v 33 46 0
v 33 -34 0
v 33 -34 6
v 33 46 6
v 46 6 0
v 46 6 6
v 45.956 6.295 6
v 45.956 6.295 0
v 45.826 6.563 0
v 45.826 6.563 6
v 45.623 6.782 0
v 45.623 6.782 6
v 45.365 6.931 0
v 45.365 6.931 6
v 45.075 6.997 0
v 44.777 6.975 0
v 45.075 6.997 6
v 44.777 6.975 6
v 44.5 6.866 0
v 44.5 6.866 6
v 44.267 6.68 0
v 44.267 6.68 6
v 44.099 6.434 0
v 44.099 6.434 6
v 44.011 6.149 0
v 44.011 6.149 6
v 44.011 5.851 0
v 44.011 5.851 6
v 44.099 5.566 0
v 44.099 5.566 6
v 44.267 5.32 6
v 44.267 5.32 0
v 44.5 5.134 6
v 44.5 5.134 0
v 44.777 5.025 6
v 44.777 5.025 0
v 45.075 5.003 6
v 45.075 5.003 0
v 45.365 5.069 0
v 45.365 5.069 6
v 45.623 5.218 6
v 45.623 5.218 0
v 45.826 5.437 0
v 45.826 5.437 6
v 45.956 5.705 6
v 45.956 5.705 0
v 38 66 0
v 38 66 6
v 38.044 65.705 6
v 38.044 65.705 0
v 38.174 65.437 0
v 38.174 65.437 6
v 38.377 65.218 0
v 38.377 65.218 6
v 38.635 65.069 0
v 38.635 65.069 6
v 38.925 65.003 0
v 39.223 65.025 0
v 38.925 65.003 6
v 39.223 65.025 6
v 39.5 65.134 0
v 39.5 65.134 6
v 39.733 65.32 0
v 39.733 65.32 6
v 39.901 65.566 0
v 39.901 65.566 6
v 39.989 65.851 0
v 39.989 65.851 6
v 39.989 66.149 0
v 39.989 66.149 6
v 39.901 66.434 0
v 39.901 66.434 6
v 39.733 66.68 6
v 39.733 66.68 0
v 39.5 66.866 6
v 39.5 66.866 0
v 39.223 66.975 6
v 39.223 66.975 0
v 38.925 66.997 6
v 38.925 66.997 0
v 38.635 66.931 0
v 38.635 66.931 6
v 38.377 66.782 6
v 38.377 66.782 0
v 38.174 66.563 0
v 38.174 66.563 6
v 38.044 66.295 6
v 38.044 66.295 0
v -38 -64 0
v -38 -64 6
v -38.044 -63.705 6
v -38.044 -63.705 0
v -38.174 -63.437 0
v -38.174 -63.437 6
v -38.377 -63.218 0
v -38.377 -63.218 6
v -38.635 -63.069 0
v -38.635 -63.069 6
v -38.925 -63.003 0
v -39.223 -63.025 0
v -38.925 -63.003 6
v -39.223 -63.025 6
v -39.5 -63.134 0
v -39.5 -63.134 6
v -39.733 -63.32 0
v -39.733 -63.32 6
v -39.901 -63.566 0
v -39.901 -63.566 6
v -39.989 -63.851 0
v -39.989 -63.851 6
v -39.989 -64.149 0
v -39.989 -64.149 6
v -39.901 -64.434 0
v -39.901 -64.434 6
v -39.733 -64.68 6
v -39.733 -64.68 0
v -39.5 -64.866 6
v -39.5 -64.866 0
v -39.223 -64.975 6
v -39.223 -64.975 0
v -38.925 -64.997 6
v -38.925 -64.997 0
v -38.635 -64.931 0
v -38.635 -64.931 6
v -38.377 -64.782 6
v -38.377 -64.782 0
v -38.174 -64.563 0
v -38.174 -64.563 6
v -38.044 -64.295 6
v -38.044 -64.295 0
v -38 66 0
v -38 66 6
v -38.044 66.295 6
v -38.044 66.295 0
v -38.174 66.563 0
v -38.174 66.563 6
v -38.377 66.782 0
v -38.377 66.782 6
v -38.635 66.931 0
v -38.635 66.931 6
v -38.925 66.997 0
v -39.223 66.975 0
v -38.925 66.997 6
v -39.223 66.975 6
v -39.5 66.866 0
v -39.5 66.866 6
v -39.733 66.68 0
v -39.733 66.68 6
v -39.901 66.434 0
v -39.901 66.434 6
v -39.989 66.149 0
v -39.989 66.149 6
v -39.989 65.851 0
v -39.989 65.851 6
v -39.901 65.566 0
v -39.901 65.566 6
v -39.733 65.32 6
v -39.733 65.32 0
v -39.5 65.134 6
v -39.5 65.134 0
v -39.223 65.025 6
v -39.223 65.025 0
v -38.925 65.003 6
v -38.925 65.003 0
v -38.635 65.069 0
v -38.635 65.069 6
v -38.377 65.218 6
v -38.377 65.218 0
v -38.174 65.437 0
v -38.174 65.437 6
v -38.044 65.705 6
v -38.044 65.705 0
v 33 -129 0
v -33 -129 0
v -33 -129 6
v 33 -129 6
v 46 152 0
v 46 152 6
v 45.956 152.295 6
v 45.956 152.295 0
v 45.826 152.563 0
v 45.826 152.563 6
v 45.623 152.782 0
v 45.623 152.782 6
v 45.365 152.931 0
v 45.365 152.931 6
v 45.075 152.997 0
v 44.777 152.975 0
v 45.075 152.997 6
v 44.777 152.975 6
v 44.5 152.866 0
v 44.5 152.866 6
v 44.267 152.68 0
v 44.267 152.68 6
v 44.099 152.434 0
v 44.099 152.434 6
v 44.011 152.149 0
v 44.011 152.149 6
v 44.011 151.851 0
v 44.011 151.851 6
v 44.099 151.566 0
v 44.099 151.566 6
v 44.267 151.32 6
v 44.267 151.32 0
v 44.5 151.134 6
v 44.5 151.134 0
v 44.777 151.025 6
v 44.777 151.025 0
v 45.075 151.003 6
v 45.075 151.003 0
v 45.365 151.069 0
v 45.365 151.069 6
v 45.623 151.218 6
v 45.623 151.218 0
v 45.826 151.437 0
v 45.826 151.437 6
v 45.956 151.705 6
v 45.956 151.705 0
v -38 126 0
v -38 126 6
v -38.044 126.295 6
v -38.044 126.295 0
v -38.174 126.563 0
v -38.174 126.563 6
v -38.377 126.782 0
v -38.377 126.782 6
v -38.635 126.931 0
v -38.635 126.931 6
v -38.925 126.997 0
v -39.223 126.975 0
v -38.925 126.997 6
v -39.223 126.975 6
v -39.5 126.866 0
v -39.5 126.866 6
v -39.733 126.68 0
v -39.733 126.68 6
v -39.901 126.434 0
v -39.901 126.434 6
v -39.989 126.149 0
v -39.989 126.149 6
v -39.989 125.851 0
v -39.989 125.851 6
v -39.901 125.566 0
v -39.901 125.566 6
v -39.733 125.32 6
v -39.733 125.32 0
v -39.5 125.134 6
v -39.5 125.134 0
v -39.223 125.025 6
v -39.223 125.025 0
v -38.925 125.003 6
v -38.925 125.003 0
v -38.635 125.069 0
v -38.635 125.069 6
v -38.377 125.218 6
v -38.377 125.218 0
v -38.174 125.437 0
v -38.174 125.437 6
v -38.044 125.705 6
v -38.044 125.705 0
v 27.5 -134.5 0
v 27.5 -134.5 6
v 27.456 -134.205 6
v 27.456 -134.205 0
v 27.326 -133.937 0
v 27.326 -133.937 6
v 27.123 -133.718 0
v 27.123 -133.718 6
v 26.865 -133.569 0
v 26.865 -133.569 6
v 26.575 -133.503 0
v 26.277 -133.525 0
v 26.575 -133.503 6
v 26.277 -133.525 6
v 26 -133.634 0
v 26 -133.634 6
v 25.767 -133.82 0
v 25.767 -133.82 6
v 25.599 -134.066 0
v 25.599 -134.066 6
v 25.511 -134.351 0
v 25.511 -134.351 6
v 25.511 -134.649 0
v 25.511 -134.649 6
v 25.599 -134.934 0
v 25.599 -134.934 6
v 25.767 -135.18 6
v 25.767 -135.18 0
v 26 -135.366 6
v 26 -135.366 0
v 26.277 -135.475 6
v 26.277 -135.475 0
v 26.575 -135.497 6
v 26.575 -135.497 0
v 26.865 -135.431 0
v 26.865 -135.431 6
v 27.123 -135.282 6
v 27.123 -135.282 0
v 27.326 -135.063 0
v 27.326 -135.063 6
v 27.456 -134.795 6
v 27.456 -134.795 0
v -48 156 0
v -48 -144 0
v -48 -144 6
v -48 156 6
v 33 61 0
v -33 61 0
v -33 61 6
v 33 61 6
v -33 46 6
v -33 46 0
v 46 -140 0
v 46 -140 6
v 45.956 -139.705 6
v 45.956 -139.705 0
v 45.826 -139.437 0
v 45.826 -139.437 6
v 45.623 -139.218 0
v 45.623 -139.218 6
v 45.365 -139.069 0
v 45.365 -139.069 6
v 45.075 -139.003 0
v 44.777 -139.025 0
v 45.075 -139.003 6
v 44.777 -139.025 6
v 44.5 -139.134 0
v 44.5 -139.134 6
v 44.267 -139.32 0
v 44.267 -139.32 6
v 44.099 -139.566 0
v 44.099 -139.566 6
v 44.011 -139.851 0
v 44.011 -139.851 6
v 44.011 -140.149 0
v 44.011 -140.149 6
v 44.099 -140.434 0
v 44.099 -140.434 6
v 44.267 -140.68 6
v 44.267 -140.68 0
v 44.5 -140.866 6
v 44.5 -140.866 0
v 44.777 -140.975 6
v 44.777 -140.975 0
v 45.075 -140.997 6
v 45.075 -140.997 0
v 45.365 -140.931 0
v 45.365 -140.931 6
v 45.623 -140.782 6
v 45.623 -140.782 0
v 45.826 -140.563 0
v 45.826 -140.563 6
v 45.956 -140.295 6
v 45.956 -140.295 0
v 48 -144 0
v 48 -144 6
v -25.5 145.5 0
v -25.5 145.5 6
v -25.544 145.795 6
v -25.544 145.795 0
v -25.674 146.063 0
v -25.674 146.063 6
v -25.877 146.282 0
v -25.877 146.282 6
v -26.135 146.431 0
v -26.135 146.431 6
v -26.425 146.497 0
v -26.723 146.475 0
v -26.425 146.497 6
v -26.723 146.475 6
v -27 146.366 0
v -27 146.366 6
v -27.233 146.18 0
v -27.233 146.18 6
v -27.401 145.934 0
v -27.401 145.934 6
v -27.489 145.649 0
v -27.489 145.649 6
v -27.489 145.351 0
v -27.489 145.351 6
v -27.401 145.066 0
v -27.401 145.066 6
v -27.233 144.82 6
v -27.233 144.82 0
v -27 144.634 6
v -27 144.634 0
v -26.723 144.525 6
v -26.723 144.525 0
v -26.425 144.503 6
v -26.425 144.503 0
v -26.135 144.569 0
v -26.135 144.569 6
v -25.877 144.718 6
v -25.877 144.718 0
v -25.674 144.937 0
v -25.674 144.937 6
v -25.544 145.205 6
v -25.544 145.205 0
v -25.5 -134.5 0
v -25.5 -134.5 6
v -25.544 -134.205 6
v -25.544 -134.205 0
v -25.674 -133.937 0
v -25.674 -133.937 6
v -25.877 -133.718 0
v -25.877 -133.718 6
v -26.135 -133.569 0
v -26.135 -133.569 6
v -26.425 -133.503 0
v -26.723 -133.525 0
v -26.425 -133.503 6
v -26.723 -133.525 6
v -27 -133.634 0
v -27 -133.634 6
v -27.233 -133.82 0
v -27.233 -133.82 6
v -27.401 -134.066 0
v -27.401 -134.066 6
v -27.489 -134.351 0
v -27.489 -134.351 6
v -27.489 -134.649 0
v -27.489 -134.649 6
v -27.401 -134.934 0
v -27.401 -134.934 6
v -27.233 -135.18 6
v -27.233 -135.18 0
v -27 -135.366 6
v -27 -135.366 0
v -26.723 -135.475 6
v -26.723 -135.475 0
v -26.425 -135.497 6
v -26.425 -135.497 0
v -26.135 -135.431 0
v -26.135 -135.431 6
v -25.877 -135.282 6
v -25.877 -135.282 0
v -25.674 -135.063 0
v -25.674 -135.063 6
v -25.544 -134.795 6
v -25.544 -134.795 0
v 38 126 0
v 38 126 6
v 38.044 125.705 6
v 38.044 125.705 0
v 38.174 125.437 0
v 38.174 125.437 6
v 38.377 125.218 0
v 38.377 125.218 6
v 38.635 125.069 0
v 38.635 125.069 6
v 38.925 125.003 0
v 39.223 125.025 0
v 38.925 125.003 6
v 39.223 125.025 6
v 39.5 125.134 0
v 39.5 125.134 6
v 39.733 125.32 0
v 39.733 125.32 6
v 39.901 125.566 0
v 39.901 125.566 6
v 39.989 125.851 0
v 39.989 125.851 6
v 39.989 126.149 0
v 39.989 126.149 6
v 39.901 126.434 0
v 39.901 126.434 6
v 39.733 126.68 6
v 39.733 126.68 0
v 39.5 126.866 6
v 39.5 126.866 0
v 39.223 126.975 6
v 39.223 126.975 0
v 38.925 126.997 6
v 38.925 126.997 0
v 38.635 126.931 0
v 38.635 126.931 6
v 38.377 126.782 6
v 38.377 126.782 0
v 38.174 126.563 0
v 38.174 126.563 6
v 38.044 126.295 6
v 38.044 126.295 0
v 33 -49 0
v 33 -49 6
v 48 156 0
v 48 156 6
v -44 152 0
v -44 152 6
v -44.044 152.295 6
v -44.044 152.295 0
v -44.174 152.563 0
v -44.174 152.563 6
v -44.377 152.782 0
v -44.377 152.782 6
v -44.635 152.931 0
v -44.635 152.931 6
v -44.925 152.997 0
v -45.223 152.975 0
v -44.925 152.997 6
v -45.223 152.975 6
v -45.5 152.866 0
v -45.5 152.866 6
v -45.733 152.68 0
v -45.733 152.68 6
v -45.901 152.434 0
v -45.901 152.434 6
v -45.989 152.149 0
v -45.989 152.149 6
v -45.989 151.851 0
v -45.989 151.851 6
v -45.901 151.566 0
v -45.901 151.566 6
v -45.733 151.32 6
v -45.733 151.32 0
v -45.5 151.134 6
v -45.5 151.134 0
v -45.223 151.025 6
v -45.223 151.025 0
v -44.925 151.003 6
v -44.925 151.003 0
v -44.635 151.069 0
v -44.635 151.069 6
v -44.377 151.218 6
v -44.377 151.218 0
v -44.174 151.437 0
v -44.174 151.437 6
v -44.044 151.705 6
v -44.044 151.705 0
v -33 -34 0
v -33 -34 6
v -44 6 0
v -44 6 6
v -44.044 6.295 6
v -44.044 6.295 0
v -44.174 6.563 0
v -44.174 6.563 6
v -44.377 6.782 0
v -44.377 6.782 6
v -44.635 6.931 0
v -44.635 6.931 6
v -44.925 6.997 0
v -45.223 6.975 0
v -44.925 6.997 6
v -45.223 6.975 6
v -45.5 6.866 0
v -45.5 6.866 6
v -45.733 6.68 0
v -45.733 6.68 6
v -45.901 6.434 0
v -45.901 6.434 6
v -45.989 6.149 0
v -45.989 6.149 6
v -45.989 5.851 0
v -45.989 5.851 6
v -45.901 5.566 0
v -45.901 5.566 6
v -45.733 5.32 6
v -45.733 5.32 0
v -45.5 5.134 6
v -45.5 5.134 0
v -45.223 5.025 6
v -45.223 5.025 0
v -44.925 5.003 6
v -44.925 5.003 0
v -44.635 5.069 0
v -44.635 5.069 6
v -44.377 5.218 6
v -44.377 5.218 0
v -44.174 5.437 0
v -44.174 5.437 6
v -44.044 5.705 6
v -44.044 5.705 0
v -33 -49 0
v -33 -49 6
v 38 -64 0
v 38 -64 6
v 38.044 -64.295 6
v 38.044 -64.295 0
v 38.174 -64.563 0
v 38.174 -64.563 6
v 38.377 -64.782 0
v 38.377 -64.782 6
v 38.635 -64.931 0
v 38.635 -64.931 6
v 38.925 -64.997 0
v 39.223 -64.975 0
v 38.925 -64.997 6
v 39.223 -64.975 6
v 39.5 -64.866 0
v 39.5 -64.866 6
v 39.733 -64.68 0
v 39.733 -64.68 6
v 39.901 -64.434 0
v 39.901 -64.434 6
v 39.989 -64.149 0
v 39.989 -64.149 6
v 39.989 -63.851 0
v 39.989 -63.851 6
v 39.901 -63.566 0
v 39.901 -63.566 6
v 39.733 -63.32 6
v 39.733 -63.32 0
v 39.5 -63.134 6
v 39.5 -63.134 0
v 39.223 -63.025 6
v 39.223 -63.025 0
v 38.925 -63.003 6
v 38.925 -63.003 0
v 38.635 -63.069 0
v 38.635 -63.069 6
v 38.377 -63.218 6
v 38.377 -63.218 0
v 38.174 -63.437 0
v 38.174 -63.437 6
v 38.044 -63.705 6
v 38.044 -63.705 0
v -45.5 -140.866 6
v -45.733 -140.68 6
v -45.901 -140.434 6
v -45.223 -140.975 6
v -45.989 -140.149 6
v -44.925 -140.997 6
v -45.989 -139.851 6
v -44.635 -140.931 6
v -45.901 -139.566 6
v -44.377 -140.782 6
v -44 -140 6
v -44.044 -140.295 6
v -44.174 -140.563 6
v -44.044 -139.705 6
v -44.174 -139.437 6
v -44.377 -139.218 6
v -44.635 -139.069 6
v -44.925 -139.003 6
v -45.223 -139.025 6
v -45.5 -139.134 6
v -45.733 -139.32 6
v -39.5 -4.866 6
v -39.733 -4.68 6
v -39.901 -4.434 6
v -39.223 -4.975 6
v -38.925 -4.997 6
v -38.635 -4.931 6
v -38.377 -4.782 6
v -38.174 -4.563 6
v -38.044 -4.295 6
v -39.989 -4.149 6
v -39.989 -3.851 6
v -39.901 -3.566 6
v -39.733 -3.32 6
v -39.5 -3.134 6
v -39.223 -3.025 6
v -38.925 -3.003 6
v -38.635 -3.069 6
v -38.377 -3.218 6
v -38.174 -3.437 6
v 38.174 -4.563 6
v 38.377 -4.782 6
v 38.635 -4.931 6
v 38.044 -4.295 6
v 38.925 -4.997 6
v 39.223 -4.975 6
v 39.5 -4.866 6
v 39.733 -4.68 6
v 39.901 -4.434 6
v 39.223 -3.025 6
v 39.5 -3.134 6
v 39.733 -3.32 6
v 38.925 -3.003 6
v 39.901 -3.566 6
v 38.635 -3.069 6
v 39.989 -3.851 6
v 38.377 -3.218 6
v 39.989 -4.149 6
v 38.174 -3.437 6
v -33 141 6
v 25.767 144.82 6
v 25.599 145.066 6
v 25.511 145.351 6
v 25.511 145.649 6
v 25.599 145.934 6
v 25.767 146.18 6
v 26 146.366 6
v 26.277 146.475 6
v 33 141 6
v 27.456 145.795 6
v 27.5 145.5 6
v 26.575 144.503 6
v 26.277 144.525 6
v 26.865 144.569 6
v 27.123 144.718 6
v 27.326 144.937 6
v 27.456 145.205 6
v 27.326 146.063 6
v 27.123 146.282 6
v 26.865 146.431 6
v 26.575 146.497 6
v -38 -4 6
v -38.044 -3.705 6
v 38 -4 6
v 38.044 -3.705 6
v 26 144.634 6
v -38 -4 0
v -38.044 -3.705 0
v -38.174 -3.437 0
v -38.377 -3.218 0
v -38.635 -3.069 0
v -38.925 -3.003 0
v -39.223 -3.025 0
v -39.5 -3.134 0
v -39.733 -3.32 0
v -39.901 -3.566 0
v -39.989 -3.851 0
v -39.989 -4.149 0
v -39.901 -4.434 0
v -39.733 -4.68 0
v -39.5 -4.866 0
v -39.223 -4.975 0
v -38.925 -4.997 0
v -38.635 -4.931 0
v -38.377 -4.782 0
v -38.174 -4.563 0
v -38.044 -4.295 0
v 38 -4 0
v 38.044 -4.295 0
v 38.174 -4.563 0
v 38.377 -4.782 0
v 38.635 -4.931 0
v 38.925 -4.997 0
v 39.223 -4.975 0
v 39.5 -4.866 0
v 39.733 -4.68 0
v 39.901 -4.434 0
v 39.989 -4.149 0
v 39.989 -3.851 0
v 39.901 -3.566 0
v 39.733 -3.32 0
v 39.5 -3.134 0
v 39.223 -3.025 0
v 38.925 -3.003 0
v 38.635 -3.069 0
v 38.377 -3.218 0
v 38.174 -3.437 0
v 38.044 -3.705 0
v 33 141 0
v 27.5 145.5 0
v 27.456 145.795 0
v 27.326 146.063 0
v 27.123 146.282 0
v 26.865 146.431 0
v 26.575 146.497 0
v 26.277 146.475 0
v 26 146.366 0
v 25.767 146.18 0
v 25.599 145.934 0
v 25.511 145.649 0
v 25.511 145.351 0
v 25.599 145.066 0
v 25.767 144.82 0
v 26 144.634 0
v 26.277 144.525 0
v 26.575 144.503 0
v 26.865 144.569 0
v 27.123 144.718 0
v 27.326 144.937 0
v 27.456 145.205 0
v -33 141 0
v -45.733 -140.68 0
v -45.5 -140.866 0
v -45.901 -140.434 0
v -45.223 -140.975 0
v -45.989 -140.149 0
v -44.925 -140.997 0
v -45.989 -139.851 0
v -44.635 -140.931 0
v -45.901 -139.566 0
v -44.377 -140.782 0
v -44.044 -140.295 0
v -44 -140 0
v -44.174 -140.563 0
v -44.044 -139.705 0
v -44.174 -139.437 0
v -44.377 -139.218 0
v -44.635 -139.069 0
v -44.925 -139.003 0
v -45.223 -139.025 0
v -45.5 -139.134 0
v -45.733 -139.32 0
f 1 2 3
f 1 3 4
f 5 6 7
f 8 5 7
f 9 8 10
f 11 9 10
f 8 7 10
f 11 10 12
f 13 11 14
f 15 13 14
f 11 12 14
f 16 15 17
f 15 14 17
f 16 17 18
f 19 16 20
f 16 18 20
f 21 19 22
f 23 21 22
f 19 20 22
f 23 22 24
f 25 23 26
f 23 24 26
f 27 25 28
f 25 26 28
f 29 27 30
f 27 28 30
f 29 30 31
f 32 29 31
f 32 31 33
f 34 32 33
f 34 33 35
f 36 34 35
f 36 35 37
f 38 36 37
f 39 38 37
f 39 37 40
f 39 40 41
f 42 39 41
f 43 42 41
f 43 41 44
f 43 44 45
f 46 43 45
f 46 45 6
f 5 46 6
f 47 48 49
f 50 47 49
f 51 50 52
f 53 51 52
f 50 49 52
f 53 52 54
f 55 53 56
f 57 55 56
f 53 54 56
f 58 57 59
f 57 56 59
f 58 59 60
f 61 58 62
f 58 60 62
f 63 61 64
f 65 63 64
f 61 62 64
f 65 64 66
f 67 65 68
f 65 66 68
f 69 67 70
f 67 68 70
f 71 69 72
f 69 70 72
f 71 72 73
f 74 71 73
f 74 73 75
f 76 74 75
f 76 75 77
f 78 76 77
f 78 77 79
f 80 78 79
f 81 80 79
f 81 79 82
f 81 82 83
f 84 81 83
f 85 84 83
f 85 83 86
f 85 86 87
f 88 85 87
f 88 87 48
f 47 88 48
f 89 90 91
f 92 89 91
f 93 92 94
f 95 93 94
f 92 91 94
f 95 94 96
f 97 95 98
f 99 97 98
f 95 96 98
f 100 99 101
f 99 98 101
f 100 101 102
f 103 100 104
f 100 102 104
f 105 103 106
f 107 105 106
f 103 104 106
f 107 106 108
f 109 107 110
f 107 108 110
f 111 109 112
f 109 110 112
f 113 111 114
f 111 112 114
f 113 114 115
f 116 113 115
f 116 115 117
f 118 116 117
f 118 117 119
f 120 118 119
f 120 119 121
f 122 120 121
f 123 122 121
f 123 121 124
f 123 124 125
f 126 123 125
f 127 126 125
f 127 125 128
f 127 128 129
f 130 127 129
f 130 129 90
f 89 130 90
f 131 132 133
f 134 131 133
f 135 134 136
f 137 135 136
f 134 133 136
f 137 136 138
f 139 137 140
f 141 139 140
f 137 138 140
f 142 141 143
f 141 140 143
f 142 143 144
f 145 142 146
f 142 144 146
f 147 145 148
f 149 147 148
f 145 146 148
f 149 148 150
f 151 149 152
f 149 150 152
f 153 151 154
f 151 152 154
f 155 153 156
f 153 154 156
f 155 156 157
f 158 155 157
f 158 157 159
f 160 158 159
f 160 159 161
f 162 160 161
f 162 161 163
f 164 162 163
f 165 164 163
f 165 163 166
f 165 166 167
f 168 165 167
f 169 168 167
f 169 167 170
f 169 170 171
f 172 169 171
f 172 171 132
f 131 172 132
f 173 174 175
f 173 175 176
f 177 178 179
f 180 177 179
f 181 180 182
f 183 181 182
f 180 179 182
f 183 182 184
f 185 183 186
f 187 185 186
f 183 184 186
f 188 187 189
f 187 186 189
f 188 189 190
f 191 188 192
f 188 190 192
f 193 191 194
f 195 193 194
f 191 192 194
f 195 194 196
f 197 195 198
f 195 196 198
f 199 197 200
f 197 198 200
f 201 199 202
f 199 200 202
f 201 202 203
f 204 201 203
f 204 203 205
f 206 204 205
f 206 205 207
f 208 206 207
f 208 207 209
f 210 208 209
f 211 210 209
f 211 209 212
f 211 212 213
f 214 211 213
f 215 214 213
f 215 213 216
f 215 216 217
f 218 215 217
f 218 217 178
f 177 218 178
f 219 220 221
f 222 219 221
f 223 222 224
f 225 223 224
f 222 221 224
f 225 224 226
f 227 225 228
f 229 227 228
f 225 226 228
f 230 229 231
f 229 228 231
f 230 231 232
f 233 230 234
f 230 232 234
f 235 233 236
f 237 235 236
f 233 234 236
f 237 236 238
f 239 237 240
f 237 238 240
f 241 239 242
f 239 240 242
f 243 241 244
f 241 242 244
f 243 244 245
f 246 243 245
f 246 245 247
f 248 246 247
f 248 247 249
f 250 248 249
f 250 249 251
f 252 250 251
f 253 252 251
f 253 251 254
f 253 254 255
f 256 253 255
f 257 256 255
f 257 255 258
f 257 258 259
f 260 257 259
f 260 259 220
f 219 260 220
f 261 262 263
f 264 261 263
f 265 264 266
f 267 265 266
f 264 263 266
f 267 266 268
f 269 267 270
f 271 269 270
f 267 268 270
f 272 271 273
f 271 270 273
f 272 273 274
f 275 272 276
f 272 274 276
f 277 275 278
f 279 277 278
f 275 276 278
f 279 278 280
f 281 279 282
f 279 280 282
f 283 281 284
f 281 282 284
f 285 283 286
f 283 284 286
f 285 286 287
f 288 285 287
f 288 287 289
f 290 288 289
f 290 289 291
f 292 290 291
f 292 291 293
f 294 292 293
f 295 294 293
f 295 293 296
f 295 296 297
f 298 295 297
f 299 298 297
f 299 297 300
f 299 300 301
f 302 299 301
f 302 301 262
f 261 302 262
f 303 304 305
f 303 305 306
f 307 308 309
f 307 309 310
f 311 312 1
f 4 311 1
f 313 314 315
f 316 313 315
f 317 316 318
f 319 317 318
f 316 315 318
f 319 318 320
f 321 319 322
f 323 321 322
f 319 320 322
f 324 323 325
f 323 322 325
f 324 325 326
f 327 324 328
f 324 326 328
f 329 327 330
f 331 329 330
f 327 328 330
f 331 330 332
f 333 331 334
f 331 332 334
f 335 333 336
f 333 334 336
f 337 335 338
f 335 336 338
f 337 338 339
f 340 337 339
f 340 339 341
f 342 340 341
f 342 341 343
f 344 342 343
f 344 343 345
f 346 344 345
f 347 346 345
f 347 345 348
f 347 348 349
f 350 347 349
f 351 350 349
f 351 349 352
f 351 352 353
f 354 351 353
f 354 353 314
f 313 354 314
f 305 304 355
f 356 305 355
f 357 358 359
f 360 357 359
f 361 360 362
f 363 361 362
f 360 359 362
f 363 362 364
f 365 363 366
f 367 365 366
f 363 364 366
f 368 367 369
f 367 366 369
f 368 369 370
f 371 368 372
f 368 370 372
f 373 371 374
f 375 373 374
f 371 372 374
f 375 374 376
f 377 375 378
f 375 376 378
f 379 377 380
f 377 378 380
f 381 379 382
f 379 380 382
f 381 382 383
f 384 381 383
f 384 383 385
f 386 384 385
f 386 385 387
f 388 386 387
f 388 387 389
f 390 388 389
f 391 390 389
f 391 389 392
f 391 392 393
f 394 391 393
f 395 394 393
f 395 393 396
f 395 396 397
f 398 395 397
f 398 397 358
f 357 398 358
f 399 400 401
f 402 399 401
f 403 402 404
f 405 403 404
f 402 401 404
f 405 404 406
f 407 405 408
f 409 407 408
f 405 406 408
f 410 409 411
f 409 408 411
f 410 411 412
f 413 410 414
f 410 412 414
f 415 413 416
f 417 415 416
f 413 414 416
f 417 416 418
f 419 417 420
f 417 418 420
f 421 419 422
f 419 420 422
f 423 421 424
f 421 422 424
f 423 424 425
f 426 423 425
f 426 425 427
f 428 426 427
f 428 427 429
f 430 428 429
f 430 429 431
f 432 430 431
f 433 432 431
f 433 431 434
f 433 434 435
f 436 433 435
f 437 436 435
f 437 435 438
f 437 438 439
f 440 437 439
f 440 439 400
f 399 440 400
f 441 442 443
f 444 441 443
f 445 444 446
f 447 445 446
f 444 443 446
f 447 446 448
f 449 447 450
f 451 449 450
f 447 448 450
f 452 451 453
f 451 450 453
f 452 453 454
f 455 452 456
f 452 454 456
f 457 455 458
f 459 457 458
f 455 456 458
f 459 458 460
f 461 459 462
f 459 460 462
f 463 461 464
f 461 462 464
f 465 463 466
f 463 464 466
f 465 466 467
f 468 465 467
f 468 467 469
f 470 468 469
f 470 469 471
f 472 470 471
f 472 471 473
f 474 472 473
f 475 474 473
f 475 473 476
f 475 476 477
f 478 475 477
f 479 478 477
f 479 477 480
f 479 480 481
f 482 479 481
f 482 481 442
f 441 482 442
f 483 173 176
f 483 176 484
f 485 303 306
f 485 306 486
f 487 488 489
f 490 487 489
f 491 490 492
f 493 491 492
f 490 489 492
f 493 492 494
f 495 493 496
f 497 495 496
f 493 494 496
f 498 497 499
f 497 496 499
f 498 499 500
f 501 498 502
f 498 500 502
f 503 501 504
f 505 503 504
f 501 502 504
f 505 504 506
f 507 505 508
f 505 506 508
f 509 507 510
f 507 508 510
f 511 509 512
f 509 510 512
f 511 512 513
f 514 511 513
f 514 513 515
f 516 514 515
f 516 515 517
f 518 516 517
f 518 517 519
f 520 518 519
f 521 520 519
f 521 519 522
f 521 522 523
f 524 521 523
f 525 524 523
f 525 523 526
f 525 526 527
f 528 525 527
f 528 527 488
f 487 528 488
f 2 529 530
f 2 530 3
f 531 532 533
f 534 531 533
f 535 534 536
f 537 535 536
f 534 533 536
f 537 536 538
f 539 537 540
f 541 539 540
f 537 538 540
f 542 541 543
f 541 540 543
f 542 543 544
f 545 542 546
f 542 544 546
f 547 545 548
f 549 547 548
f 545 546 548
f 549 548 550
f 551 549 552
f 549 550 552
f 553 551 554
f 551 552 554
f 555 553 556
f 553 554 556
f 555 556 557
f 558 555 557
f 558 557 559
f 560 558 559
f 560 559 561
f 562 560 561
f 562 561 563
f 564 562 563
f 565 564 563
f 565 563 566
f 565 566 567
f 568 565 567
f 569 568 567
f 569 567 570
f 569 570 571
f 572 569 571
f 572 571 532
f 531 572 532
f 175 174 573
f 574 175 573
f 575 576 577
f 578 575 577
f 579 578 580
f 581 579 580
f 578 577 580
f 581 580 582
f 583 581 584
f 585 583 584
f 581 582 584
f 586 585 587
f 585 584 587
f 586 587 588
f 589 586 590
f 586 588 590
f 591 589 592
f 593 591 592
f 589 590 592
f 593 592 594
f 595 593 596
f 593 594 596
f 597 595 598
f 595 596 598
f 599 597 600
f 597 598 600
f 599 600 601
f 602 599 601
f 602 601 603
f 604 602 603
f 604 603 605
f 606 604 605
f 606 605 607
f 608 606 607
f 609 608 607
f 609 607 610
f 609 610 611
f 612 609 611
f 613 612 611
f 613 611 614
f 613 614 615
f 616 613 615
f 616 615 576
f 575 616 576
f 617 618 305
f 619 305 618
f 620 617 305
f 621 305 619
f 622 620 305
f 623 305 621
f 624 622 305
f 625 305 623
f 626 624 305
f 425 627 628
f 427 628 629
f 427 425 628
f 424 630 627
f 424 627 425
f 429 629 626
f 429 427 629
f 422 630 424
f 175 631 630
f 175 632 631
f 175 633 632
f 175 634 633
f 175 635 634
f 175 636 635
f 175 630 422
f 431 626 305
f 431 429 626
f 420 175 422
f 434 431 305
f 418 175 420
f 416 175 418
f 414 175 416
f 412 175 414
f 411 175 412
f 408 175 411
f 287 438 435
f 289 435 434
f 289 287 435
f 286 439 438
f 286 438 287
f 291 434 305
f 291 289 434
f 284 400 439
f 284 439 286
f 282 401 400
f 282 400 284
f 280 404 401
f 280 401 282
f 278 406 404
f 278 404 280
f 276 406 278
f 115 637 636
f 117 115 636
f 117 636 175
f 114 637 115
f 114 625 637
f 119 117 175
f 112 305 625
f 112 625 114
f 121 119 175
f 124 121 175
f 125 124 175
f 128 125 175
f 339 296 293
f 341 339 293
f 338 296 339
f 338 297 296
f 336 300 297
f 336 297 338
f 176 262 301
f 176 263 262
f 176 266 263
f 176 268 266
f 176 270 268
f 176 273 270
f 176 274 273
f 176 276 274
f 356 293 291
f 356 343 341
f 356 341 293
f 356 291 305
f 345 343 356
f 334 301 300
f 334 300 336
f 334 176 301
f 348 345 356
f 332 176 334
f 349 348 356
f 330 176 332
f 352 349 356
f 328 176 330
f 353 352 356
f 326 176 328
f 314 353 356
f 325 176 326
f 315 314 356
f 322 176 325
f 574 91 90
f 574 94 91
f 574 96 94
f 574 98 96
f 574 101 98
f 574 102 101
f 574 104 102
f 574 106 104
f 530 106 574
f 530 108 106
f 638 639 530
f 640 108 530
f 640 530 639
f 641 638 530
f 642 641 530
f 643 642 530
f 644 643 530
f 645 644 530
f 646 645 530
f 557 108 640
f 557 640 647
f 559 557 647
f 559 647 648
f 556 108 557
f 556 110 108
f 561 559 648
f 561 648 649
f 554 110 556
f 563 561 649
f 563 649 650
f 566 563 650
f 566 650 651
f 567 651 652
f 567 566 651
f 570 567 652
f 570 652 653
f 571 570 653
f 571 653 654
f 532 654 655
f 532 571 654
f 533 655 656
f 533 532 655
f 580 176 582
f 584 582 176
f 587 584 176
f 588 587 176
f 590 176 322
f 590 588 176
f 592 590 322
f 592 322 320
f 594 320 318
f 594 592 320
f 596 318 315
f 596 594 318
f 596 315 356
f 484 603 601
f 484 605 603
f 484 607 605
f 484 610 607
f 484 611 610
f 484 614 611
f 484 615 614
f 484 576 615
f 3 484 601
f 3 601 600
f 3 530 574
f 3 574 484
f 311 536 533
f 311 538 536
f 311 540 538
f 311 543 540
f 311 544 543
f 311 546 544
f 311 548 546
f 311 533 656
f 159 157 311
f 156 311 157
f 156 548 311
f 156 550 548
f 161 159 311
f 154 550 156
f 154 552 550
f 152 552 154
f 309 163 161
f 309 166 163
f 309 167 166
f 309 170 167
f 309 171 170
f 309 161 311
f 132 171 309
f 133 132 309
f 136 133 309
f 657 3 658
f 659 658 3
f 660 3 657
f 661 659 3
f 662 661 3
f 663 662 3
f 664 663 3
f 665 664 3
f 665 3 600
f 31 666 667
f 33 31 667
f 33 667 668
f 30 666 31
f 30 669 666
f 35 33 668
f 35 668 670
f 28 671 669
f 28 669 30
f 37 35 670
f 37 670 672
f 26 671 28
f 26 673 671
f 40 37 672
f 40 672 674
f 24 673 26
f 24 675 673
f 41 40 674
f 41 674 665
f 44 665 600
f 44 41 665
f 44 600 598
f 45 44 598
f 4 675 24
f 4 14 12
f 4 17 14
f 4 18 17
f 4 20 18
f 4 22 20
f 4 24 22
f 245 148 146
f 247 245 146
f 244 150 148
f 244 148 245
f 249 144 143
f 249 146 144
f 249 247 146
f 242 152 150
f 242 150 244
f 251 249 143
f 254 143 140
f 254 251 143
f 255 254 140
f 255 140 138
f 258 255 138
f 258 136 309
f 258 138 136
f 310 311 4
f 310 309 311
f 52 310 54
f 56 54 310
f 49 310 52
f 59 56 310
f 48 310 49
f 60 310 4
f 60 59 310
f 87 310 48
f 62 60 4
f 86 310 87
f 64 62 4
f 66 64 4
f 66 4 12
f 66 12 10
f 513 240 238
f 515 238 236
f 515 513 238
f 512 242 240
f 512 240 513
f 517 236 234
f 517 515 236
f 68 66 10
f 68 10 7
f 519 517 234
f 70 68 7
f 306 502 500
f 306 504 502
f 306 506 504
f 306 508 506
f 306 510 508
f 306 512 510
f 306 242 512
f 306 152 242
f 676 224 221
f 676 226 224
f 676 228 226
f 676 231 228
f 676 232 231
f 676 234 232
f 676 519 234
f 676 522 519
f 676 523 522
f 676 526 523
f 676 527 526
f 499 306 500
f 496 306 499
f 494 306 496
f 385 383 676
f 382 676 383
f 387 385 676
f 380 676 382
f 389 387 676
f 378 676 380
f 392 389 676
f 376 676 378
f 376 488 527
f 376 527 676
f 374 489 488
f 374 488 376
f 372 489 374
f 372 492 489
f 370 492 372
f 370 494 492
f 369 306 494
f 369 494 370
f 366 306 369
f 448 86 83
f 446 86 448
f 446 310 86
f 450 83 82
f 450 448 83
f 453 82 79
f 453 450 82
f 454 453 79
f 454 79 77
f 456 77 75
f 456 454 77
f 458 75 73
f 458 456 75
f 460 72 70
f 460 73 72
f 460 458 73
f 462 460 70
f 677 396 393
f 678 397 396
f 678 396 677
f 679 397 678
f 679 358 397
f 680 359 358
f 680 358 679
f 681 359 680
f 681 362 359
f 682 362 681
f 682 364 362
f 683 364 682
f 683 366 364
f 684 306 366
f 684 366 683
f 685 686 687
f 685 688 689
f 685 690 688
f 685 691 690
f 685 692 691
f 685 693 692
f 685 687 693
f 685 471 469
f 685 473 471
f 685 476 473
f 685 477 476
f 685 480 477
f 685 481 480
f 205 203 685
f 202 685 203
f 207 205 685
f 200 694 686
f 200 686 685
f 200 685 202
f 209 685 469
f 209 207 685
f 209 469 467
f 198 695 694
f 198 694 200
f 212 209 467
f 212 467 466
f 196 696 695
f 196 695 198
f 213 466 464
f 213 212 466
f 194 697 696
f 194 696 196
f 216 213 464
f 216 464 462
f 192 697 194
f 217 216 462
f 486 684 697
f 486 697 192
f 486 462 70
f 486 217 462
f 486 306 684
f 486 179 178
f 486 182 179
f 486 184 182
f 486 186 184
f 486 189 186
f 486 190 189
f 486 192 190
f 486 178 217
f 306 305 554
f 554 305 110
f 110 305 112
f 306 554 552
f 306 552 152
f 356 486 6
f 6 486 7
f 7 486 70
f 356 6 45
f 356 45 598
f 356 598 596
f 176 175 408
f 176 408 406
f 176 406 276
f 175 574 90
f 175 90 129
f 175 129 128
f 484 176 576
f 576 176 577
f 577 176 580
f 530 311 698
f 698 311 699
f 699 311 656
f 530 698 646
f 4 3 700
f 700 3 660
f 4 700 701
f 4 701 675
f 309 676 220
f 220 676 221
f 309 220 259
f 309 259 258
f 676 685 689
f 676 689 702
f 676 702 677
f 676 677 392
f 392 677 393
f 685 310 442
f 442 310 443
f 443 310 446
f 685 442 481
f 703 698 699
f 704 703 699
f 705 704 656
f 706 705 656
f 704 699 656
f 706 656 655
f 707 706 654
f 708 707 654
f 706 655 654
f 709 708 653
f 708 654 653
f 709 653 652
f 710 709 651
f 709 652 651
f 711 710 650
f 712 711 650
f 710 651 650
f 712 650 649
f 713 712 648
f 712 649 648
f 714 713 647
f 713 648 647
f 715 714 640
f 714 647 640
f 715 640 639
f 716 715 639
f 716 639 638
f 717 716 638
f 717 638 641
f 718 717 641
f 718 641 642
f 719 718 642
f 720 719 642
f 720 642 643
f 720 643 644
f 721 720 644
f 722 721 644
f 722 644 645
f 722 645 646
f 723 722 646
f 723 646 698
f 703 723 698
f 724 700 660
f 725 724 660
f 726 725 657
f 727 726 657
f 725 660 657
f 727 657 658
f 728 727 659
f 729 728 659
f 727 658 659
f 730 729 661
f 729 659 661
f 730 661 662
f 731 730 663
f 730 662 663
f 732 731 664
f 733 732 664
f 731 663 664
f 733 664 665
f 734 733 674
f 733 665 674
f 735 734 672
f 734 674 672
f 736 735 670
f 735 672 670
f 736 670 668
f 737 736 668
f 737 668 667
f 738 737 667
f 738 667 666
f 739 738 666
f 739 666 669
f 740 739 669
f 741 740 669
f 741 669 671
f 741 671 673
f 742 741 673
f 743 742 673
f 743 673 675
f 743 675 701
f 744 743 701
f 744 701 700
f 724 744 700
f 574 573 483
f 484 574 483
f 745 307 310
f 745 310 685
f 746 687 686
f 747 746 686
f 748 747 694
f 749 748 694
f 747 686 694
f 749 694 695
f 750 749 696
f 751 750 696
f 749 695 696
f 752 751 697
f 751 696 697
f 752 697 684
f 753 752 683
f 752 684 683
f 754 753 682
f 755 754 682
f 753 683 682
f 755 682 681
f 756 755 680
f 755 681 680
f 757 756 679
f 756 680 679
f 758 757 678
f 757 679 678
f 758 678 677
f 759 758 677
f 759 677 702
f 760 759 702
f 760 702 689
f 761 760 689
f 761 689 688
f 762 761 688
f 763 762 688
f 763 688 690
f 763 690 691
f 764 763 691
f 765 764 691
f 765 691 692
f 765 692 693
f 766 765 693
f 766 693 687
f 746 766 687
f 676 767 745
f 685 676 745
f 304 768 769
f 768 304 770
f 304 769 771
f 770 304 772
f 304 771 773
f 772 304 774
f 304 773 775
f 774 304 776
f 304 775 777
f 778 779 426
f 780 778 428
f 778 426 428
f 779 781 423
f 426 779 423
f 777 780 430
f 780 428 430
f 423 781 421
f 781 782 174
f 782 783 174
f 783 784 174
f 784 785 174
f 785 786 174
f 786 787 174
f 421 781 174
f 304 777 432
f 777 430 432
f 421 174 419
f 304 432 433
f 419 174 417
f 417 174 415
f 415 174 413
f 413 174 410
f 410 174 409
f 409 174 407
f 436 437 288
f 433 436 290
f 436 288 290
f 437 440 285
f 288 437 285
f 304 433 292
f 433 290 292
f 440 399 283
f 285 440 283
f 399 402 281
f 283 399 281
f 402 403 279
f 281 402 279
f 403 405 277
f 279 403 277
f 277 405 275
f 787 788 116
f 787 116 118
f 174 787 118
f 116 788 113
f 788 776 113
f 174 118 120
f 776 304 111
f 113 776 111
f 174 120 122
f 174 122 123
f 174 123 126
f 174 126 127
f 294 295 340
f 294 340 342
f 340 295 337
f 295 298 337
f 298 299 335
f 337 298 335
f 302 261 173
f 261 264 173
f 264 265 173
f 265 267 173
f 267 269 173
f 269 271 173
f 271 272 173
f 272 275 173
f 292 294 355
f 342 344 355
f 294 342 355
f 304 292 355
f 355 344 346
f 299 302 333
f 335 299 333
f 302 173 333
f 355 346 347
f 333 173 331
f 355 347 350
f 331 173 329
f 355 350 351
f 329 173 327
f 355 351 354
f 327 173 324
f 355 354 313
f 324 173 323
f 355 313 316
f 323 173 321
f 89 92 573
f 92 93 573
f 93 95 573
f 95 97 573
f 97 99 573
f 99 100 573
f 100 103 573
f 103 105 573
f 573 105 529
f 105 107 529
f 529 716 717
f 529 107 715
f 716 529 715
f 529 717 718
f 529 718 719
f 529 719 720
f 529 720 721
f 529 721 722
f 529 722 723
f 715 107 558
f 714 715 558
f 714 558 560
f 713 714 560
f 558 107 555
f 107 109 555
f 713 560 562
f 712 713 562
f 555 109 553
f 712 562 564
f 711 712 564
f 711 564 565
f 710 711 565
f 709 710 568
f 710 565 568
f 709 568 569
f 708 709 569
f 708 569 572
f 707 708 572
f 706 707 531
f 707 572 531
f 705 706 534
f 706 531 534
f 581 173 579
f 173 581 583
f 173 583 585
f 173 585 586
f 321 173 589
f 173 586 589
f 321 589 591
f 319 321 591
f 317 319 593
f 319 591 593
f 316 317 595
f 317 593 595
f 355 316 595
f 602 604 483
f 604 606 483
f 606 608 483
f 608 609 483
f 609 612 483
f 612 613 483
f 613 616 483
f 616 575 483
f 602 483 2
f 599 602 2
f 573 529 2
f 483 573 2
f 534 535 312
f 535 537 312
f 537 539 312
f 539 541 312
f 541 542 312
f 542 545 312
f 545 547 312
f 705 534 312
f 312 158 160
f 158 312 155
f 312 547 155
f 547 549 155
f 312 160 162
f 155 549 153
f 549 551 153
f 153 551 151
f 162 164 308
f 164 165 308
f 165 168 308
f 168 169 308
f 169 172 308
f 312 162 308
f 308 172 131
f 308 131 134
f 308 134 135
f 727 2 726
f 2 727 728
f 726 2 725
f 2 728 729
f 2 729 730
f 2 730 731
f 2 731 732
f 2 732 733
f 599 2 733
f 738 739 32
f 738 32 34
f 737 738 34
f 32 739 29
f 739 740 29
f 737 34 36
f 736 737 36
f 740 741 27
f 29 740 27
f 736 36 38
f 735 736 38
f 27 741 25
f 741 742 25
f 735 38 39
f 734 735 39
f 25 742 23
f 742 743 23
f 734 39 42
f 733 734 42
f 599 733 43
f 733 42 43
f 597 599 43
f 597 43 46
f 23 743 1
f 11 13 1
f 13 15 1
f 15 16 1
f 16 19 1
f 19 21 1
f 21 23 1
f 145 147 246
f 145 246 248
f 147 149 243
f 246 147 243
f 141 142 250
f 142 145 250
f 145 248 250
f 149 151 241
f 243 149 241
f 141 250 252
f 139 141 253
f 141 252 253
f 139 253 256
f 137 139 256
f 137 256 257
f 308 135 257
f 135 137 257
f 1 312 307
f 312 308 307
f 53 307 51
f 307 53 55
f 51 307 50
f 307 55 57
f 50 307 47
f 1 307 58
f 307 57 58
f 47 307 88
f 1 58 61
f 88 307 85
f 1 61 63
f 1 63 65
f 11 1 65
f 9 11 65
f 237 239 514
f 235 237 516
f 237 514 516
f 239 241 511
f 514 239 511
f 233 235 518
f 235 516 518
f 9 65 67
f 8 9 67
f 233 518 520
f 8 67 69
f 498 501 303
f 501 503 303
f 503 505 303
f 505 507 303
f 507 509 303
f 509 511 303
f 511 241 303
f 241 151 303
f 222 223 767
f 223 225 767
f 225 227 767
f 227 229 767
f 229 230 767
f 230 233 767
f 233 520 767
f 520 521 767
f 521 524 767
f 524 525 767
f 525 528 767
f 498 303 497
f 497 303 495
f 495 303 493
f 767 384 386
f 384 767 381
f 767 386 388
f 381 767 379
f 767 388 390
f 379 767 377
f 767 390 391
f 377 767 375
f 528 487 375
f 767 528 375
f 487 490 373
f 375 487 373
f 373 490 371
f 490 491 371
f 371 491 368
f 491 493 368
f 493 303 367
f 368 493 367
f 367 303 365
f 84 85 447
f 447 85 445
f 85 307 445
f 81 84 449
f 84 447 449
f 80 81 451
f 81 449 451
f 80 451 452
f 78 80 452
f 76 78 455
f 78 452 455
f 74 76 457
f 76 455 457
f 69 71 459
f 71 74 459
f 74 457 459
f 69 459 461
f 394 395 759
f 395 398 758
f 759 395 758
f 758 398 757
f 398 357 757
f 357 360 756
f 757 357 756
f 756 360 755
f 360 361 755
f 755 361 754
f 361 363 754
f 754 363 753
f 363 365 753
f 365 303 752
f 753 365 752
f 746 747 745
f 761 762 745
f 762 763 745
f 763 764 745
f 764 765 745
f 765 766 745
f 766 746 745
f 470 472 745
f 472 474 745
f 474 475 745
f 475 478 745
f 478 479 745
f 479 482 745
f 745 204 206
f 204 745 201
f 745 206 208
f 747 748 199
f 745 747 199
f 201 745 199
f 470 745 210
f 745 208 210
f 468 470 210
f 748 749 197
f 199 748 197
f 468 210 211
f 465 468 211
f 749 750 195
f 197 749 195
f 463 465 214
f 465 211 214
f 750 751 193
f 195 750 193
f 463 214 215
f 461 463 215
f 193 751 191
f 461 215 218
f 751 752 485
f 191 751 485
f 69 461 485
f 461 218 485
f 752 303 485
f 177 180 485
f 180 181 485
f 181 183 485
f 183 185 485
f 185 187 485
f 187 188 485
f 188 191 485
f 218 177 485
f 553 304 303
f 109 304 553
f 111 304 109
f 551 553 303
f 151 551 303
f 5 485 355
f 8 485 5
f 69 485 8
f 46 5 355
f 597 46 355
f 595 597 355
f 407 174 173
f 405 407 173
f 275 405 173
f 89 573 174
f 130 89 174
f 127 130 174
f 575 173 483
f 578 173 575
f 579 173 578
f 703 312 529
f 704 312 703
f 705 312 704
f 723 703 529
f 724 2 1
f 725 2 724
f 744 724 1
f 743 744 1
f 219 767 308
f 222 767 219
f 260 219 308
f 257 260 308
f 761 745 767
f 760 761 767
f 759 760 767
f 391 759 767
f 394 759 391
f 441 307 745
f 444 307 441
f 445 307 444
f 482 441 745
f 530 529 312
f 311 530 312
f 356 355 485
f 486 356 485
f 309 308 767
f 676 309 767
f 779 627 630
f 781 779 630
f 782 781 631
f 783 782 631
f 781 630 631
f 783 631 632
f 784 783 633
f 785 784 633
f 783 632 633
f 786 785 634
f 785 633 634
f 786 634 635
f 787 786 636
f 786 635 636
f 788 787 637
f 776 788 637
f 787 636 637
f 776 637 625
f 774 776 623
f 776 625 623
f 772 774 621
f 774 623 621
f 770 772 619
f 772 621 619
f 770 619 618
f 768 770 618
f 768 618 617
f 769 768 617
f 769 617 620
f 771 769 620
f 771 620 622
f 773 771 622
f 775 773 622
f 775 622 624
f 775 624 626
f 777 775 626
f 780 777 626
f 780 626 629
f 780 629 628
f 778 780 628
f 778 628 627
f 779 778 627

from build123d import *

# Parameters (mm, degrees)
SKETCH1_W           = 96
SKETCH1_H           = 300
SKETCH1_W_2         = 66
SKETCH1_H_2         = 80
BOSS_EXTRUDE1_DEPTH = 6
SKETCH3_R           = 1
CUT_EXTRUDE6_DEPTH  = 10
SKETCH5_R           = 1
CUT_EXTRUDE9_DEPTH  = 10
SKETCH7_R           = 1
CUT_EXTRUDE10_DEPTH = 10


with BuildPart() as part:
    # Sketch1 → Boss-Extrude1 (new body)
    with BuildSketch(Plane.XY):
        with Locations((0, 6)):
            Rectangle(SKETCH1_W, SKETCH1_H)
        with Locations((0, 101)):
            Rectangle(SKETCH1_W_2, SKETCH1_H_2, mode=Mode.SUBTRACT)
        with Locations((0, -89)):
            Rectangle(SKETCH1_W_2, SKETCH1_H_2, mode=Mode.SUBTRACT)
        with Locations((0, 6)):
            Rectangle(SKETCH1_W_2, SKETCH1_H_2, mode=Mode.SUBTRACT)
    extrude(amount=BOSS_EXTRUDE1_DEPTH)

    # Sketch3 → Cut-Extrude6 (cut)
    with BuildSketch(Plane.XY.offset(6)):
        with Locations((-39, 126)):
            Circle(SKETCH3_R)
        with Locations((-39, -4)):
            Circle(SKETCH3_R)
        with Locations((-39, 66)):
            Circle(SKETCH3_R)
        with Locations((-39, -64)):
            Circle(SKETCH3_R)
        with Locations(Location((39, -64, 0), (0, 0, 180))):
            Circle(SKETCH3_R)
        with Locations(Location((39, -4, 0), (0, 0, 180))):
            Circle(SKETCH3_R)
        with Locations(Location((39, 66, 0), (0, 0, 180))):
            Circle(SKETCH3_R)
        with Locations(Location((39, 126, 0), (0, 0, 180))):
            Circle(SKETCH3_R)
    extrude(amount=-CUT_EXTRUDE6_DEPTH, mode=Mode.SUBTRACT)

    # Sketch5 → Cut-Extrude9 (cut)
    with BuildSketch(Plane.XY.offset(6)):
        with Locations((-26.5, -134.5)):
            Circle(SKETCH5_R)
        with Locations((26.5, -134.5)):
            Circle(SKETCH5_R)
        with Locations((-26.5, 145.5)):
            Circle(SKETCH5_R)
        with Locations((26.5, 145.5)):
            Circle(SKETCH5_R)
    extrude(amount=-CUT_EXTRUDE9_DEPTH, mode=Mode.SUBTRACT)

    # Sketch7 → Cut-Extrude10 (cut)
    with BuildSketch(Plane.XY.offset(6)):
        with Locations((45, -140)):
            Circle(SKETCH7_R)
        with Locations((-45, -140)):
            Circle(SKETCH7_R)
        with Locations((45, 152)):
            Circle(SKETCH7_R)
        with Locations((-45, 152)):
            Circle(SKETCH7_R)
        with Locations((45, 6)):
            Circle(SKETCH7_R)
        with Locations((-45, 6)):
            Circle(SKETCH7_R)
    extrude(amount=-CUT_EXTRUDE10_DEPTH, mode=Mode.SUBTRACT)


solid = part.part
